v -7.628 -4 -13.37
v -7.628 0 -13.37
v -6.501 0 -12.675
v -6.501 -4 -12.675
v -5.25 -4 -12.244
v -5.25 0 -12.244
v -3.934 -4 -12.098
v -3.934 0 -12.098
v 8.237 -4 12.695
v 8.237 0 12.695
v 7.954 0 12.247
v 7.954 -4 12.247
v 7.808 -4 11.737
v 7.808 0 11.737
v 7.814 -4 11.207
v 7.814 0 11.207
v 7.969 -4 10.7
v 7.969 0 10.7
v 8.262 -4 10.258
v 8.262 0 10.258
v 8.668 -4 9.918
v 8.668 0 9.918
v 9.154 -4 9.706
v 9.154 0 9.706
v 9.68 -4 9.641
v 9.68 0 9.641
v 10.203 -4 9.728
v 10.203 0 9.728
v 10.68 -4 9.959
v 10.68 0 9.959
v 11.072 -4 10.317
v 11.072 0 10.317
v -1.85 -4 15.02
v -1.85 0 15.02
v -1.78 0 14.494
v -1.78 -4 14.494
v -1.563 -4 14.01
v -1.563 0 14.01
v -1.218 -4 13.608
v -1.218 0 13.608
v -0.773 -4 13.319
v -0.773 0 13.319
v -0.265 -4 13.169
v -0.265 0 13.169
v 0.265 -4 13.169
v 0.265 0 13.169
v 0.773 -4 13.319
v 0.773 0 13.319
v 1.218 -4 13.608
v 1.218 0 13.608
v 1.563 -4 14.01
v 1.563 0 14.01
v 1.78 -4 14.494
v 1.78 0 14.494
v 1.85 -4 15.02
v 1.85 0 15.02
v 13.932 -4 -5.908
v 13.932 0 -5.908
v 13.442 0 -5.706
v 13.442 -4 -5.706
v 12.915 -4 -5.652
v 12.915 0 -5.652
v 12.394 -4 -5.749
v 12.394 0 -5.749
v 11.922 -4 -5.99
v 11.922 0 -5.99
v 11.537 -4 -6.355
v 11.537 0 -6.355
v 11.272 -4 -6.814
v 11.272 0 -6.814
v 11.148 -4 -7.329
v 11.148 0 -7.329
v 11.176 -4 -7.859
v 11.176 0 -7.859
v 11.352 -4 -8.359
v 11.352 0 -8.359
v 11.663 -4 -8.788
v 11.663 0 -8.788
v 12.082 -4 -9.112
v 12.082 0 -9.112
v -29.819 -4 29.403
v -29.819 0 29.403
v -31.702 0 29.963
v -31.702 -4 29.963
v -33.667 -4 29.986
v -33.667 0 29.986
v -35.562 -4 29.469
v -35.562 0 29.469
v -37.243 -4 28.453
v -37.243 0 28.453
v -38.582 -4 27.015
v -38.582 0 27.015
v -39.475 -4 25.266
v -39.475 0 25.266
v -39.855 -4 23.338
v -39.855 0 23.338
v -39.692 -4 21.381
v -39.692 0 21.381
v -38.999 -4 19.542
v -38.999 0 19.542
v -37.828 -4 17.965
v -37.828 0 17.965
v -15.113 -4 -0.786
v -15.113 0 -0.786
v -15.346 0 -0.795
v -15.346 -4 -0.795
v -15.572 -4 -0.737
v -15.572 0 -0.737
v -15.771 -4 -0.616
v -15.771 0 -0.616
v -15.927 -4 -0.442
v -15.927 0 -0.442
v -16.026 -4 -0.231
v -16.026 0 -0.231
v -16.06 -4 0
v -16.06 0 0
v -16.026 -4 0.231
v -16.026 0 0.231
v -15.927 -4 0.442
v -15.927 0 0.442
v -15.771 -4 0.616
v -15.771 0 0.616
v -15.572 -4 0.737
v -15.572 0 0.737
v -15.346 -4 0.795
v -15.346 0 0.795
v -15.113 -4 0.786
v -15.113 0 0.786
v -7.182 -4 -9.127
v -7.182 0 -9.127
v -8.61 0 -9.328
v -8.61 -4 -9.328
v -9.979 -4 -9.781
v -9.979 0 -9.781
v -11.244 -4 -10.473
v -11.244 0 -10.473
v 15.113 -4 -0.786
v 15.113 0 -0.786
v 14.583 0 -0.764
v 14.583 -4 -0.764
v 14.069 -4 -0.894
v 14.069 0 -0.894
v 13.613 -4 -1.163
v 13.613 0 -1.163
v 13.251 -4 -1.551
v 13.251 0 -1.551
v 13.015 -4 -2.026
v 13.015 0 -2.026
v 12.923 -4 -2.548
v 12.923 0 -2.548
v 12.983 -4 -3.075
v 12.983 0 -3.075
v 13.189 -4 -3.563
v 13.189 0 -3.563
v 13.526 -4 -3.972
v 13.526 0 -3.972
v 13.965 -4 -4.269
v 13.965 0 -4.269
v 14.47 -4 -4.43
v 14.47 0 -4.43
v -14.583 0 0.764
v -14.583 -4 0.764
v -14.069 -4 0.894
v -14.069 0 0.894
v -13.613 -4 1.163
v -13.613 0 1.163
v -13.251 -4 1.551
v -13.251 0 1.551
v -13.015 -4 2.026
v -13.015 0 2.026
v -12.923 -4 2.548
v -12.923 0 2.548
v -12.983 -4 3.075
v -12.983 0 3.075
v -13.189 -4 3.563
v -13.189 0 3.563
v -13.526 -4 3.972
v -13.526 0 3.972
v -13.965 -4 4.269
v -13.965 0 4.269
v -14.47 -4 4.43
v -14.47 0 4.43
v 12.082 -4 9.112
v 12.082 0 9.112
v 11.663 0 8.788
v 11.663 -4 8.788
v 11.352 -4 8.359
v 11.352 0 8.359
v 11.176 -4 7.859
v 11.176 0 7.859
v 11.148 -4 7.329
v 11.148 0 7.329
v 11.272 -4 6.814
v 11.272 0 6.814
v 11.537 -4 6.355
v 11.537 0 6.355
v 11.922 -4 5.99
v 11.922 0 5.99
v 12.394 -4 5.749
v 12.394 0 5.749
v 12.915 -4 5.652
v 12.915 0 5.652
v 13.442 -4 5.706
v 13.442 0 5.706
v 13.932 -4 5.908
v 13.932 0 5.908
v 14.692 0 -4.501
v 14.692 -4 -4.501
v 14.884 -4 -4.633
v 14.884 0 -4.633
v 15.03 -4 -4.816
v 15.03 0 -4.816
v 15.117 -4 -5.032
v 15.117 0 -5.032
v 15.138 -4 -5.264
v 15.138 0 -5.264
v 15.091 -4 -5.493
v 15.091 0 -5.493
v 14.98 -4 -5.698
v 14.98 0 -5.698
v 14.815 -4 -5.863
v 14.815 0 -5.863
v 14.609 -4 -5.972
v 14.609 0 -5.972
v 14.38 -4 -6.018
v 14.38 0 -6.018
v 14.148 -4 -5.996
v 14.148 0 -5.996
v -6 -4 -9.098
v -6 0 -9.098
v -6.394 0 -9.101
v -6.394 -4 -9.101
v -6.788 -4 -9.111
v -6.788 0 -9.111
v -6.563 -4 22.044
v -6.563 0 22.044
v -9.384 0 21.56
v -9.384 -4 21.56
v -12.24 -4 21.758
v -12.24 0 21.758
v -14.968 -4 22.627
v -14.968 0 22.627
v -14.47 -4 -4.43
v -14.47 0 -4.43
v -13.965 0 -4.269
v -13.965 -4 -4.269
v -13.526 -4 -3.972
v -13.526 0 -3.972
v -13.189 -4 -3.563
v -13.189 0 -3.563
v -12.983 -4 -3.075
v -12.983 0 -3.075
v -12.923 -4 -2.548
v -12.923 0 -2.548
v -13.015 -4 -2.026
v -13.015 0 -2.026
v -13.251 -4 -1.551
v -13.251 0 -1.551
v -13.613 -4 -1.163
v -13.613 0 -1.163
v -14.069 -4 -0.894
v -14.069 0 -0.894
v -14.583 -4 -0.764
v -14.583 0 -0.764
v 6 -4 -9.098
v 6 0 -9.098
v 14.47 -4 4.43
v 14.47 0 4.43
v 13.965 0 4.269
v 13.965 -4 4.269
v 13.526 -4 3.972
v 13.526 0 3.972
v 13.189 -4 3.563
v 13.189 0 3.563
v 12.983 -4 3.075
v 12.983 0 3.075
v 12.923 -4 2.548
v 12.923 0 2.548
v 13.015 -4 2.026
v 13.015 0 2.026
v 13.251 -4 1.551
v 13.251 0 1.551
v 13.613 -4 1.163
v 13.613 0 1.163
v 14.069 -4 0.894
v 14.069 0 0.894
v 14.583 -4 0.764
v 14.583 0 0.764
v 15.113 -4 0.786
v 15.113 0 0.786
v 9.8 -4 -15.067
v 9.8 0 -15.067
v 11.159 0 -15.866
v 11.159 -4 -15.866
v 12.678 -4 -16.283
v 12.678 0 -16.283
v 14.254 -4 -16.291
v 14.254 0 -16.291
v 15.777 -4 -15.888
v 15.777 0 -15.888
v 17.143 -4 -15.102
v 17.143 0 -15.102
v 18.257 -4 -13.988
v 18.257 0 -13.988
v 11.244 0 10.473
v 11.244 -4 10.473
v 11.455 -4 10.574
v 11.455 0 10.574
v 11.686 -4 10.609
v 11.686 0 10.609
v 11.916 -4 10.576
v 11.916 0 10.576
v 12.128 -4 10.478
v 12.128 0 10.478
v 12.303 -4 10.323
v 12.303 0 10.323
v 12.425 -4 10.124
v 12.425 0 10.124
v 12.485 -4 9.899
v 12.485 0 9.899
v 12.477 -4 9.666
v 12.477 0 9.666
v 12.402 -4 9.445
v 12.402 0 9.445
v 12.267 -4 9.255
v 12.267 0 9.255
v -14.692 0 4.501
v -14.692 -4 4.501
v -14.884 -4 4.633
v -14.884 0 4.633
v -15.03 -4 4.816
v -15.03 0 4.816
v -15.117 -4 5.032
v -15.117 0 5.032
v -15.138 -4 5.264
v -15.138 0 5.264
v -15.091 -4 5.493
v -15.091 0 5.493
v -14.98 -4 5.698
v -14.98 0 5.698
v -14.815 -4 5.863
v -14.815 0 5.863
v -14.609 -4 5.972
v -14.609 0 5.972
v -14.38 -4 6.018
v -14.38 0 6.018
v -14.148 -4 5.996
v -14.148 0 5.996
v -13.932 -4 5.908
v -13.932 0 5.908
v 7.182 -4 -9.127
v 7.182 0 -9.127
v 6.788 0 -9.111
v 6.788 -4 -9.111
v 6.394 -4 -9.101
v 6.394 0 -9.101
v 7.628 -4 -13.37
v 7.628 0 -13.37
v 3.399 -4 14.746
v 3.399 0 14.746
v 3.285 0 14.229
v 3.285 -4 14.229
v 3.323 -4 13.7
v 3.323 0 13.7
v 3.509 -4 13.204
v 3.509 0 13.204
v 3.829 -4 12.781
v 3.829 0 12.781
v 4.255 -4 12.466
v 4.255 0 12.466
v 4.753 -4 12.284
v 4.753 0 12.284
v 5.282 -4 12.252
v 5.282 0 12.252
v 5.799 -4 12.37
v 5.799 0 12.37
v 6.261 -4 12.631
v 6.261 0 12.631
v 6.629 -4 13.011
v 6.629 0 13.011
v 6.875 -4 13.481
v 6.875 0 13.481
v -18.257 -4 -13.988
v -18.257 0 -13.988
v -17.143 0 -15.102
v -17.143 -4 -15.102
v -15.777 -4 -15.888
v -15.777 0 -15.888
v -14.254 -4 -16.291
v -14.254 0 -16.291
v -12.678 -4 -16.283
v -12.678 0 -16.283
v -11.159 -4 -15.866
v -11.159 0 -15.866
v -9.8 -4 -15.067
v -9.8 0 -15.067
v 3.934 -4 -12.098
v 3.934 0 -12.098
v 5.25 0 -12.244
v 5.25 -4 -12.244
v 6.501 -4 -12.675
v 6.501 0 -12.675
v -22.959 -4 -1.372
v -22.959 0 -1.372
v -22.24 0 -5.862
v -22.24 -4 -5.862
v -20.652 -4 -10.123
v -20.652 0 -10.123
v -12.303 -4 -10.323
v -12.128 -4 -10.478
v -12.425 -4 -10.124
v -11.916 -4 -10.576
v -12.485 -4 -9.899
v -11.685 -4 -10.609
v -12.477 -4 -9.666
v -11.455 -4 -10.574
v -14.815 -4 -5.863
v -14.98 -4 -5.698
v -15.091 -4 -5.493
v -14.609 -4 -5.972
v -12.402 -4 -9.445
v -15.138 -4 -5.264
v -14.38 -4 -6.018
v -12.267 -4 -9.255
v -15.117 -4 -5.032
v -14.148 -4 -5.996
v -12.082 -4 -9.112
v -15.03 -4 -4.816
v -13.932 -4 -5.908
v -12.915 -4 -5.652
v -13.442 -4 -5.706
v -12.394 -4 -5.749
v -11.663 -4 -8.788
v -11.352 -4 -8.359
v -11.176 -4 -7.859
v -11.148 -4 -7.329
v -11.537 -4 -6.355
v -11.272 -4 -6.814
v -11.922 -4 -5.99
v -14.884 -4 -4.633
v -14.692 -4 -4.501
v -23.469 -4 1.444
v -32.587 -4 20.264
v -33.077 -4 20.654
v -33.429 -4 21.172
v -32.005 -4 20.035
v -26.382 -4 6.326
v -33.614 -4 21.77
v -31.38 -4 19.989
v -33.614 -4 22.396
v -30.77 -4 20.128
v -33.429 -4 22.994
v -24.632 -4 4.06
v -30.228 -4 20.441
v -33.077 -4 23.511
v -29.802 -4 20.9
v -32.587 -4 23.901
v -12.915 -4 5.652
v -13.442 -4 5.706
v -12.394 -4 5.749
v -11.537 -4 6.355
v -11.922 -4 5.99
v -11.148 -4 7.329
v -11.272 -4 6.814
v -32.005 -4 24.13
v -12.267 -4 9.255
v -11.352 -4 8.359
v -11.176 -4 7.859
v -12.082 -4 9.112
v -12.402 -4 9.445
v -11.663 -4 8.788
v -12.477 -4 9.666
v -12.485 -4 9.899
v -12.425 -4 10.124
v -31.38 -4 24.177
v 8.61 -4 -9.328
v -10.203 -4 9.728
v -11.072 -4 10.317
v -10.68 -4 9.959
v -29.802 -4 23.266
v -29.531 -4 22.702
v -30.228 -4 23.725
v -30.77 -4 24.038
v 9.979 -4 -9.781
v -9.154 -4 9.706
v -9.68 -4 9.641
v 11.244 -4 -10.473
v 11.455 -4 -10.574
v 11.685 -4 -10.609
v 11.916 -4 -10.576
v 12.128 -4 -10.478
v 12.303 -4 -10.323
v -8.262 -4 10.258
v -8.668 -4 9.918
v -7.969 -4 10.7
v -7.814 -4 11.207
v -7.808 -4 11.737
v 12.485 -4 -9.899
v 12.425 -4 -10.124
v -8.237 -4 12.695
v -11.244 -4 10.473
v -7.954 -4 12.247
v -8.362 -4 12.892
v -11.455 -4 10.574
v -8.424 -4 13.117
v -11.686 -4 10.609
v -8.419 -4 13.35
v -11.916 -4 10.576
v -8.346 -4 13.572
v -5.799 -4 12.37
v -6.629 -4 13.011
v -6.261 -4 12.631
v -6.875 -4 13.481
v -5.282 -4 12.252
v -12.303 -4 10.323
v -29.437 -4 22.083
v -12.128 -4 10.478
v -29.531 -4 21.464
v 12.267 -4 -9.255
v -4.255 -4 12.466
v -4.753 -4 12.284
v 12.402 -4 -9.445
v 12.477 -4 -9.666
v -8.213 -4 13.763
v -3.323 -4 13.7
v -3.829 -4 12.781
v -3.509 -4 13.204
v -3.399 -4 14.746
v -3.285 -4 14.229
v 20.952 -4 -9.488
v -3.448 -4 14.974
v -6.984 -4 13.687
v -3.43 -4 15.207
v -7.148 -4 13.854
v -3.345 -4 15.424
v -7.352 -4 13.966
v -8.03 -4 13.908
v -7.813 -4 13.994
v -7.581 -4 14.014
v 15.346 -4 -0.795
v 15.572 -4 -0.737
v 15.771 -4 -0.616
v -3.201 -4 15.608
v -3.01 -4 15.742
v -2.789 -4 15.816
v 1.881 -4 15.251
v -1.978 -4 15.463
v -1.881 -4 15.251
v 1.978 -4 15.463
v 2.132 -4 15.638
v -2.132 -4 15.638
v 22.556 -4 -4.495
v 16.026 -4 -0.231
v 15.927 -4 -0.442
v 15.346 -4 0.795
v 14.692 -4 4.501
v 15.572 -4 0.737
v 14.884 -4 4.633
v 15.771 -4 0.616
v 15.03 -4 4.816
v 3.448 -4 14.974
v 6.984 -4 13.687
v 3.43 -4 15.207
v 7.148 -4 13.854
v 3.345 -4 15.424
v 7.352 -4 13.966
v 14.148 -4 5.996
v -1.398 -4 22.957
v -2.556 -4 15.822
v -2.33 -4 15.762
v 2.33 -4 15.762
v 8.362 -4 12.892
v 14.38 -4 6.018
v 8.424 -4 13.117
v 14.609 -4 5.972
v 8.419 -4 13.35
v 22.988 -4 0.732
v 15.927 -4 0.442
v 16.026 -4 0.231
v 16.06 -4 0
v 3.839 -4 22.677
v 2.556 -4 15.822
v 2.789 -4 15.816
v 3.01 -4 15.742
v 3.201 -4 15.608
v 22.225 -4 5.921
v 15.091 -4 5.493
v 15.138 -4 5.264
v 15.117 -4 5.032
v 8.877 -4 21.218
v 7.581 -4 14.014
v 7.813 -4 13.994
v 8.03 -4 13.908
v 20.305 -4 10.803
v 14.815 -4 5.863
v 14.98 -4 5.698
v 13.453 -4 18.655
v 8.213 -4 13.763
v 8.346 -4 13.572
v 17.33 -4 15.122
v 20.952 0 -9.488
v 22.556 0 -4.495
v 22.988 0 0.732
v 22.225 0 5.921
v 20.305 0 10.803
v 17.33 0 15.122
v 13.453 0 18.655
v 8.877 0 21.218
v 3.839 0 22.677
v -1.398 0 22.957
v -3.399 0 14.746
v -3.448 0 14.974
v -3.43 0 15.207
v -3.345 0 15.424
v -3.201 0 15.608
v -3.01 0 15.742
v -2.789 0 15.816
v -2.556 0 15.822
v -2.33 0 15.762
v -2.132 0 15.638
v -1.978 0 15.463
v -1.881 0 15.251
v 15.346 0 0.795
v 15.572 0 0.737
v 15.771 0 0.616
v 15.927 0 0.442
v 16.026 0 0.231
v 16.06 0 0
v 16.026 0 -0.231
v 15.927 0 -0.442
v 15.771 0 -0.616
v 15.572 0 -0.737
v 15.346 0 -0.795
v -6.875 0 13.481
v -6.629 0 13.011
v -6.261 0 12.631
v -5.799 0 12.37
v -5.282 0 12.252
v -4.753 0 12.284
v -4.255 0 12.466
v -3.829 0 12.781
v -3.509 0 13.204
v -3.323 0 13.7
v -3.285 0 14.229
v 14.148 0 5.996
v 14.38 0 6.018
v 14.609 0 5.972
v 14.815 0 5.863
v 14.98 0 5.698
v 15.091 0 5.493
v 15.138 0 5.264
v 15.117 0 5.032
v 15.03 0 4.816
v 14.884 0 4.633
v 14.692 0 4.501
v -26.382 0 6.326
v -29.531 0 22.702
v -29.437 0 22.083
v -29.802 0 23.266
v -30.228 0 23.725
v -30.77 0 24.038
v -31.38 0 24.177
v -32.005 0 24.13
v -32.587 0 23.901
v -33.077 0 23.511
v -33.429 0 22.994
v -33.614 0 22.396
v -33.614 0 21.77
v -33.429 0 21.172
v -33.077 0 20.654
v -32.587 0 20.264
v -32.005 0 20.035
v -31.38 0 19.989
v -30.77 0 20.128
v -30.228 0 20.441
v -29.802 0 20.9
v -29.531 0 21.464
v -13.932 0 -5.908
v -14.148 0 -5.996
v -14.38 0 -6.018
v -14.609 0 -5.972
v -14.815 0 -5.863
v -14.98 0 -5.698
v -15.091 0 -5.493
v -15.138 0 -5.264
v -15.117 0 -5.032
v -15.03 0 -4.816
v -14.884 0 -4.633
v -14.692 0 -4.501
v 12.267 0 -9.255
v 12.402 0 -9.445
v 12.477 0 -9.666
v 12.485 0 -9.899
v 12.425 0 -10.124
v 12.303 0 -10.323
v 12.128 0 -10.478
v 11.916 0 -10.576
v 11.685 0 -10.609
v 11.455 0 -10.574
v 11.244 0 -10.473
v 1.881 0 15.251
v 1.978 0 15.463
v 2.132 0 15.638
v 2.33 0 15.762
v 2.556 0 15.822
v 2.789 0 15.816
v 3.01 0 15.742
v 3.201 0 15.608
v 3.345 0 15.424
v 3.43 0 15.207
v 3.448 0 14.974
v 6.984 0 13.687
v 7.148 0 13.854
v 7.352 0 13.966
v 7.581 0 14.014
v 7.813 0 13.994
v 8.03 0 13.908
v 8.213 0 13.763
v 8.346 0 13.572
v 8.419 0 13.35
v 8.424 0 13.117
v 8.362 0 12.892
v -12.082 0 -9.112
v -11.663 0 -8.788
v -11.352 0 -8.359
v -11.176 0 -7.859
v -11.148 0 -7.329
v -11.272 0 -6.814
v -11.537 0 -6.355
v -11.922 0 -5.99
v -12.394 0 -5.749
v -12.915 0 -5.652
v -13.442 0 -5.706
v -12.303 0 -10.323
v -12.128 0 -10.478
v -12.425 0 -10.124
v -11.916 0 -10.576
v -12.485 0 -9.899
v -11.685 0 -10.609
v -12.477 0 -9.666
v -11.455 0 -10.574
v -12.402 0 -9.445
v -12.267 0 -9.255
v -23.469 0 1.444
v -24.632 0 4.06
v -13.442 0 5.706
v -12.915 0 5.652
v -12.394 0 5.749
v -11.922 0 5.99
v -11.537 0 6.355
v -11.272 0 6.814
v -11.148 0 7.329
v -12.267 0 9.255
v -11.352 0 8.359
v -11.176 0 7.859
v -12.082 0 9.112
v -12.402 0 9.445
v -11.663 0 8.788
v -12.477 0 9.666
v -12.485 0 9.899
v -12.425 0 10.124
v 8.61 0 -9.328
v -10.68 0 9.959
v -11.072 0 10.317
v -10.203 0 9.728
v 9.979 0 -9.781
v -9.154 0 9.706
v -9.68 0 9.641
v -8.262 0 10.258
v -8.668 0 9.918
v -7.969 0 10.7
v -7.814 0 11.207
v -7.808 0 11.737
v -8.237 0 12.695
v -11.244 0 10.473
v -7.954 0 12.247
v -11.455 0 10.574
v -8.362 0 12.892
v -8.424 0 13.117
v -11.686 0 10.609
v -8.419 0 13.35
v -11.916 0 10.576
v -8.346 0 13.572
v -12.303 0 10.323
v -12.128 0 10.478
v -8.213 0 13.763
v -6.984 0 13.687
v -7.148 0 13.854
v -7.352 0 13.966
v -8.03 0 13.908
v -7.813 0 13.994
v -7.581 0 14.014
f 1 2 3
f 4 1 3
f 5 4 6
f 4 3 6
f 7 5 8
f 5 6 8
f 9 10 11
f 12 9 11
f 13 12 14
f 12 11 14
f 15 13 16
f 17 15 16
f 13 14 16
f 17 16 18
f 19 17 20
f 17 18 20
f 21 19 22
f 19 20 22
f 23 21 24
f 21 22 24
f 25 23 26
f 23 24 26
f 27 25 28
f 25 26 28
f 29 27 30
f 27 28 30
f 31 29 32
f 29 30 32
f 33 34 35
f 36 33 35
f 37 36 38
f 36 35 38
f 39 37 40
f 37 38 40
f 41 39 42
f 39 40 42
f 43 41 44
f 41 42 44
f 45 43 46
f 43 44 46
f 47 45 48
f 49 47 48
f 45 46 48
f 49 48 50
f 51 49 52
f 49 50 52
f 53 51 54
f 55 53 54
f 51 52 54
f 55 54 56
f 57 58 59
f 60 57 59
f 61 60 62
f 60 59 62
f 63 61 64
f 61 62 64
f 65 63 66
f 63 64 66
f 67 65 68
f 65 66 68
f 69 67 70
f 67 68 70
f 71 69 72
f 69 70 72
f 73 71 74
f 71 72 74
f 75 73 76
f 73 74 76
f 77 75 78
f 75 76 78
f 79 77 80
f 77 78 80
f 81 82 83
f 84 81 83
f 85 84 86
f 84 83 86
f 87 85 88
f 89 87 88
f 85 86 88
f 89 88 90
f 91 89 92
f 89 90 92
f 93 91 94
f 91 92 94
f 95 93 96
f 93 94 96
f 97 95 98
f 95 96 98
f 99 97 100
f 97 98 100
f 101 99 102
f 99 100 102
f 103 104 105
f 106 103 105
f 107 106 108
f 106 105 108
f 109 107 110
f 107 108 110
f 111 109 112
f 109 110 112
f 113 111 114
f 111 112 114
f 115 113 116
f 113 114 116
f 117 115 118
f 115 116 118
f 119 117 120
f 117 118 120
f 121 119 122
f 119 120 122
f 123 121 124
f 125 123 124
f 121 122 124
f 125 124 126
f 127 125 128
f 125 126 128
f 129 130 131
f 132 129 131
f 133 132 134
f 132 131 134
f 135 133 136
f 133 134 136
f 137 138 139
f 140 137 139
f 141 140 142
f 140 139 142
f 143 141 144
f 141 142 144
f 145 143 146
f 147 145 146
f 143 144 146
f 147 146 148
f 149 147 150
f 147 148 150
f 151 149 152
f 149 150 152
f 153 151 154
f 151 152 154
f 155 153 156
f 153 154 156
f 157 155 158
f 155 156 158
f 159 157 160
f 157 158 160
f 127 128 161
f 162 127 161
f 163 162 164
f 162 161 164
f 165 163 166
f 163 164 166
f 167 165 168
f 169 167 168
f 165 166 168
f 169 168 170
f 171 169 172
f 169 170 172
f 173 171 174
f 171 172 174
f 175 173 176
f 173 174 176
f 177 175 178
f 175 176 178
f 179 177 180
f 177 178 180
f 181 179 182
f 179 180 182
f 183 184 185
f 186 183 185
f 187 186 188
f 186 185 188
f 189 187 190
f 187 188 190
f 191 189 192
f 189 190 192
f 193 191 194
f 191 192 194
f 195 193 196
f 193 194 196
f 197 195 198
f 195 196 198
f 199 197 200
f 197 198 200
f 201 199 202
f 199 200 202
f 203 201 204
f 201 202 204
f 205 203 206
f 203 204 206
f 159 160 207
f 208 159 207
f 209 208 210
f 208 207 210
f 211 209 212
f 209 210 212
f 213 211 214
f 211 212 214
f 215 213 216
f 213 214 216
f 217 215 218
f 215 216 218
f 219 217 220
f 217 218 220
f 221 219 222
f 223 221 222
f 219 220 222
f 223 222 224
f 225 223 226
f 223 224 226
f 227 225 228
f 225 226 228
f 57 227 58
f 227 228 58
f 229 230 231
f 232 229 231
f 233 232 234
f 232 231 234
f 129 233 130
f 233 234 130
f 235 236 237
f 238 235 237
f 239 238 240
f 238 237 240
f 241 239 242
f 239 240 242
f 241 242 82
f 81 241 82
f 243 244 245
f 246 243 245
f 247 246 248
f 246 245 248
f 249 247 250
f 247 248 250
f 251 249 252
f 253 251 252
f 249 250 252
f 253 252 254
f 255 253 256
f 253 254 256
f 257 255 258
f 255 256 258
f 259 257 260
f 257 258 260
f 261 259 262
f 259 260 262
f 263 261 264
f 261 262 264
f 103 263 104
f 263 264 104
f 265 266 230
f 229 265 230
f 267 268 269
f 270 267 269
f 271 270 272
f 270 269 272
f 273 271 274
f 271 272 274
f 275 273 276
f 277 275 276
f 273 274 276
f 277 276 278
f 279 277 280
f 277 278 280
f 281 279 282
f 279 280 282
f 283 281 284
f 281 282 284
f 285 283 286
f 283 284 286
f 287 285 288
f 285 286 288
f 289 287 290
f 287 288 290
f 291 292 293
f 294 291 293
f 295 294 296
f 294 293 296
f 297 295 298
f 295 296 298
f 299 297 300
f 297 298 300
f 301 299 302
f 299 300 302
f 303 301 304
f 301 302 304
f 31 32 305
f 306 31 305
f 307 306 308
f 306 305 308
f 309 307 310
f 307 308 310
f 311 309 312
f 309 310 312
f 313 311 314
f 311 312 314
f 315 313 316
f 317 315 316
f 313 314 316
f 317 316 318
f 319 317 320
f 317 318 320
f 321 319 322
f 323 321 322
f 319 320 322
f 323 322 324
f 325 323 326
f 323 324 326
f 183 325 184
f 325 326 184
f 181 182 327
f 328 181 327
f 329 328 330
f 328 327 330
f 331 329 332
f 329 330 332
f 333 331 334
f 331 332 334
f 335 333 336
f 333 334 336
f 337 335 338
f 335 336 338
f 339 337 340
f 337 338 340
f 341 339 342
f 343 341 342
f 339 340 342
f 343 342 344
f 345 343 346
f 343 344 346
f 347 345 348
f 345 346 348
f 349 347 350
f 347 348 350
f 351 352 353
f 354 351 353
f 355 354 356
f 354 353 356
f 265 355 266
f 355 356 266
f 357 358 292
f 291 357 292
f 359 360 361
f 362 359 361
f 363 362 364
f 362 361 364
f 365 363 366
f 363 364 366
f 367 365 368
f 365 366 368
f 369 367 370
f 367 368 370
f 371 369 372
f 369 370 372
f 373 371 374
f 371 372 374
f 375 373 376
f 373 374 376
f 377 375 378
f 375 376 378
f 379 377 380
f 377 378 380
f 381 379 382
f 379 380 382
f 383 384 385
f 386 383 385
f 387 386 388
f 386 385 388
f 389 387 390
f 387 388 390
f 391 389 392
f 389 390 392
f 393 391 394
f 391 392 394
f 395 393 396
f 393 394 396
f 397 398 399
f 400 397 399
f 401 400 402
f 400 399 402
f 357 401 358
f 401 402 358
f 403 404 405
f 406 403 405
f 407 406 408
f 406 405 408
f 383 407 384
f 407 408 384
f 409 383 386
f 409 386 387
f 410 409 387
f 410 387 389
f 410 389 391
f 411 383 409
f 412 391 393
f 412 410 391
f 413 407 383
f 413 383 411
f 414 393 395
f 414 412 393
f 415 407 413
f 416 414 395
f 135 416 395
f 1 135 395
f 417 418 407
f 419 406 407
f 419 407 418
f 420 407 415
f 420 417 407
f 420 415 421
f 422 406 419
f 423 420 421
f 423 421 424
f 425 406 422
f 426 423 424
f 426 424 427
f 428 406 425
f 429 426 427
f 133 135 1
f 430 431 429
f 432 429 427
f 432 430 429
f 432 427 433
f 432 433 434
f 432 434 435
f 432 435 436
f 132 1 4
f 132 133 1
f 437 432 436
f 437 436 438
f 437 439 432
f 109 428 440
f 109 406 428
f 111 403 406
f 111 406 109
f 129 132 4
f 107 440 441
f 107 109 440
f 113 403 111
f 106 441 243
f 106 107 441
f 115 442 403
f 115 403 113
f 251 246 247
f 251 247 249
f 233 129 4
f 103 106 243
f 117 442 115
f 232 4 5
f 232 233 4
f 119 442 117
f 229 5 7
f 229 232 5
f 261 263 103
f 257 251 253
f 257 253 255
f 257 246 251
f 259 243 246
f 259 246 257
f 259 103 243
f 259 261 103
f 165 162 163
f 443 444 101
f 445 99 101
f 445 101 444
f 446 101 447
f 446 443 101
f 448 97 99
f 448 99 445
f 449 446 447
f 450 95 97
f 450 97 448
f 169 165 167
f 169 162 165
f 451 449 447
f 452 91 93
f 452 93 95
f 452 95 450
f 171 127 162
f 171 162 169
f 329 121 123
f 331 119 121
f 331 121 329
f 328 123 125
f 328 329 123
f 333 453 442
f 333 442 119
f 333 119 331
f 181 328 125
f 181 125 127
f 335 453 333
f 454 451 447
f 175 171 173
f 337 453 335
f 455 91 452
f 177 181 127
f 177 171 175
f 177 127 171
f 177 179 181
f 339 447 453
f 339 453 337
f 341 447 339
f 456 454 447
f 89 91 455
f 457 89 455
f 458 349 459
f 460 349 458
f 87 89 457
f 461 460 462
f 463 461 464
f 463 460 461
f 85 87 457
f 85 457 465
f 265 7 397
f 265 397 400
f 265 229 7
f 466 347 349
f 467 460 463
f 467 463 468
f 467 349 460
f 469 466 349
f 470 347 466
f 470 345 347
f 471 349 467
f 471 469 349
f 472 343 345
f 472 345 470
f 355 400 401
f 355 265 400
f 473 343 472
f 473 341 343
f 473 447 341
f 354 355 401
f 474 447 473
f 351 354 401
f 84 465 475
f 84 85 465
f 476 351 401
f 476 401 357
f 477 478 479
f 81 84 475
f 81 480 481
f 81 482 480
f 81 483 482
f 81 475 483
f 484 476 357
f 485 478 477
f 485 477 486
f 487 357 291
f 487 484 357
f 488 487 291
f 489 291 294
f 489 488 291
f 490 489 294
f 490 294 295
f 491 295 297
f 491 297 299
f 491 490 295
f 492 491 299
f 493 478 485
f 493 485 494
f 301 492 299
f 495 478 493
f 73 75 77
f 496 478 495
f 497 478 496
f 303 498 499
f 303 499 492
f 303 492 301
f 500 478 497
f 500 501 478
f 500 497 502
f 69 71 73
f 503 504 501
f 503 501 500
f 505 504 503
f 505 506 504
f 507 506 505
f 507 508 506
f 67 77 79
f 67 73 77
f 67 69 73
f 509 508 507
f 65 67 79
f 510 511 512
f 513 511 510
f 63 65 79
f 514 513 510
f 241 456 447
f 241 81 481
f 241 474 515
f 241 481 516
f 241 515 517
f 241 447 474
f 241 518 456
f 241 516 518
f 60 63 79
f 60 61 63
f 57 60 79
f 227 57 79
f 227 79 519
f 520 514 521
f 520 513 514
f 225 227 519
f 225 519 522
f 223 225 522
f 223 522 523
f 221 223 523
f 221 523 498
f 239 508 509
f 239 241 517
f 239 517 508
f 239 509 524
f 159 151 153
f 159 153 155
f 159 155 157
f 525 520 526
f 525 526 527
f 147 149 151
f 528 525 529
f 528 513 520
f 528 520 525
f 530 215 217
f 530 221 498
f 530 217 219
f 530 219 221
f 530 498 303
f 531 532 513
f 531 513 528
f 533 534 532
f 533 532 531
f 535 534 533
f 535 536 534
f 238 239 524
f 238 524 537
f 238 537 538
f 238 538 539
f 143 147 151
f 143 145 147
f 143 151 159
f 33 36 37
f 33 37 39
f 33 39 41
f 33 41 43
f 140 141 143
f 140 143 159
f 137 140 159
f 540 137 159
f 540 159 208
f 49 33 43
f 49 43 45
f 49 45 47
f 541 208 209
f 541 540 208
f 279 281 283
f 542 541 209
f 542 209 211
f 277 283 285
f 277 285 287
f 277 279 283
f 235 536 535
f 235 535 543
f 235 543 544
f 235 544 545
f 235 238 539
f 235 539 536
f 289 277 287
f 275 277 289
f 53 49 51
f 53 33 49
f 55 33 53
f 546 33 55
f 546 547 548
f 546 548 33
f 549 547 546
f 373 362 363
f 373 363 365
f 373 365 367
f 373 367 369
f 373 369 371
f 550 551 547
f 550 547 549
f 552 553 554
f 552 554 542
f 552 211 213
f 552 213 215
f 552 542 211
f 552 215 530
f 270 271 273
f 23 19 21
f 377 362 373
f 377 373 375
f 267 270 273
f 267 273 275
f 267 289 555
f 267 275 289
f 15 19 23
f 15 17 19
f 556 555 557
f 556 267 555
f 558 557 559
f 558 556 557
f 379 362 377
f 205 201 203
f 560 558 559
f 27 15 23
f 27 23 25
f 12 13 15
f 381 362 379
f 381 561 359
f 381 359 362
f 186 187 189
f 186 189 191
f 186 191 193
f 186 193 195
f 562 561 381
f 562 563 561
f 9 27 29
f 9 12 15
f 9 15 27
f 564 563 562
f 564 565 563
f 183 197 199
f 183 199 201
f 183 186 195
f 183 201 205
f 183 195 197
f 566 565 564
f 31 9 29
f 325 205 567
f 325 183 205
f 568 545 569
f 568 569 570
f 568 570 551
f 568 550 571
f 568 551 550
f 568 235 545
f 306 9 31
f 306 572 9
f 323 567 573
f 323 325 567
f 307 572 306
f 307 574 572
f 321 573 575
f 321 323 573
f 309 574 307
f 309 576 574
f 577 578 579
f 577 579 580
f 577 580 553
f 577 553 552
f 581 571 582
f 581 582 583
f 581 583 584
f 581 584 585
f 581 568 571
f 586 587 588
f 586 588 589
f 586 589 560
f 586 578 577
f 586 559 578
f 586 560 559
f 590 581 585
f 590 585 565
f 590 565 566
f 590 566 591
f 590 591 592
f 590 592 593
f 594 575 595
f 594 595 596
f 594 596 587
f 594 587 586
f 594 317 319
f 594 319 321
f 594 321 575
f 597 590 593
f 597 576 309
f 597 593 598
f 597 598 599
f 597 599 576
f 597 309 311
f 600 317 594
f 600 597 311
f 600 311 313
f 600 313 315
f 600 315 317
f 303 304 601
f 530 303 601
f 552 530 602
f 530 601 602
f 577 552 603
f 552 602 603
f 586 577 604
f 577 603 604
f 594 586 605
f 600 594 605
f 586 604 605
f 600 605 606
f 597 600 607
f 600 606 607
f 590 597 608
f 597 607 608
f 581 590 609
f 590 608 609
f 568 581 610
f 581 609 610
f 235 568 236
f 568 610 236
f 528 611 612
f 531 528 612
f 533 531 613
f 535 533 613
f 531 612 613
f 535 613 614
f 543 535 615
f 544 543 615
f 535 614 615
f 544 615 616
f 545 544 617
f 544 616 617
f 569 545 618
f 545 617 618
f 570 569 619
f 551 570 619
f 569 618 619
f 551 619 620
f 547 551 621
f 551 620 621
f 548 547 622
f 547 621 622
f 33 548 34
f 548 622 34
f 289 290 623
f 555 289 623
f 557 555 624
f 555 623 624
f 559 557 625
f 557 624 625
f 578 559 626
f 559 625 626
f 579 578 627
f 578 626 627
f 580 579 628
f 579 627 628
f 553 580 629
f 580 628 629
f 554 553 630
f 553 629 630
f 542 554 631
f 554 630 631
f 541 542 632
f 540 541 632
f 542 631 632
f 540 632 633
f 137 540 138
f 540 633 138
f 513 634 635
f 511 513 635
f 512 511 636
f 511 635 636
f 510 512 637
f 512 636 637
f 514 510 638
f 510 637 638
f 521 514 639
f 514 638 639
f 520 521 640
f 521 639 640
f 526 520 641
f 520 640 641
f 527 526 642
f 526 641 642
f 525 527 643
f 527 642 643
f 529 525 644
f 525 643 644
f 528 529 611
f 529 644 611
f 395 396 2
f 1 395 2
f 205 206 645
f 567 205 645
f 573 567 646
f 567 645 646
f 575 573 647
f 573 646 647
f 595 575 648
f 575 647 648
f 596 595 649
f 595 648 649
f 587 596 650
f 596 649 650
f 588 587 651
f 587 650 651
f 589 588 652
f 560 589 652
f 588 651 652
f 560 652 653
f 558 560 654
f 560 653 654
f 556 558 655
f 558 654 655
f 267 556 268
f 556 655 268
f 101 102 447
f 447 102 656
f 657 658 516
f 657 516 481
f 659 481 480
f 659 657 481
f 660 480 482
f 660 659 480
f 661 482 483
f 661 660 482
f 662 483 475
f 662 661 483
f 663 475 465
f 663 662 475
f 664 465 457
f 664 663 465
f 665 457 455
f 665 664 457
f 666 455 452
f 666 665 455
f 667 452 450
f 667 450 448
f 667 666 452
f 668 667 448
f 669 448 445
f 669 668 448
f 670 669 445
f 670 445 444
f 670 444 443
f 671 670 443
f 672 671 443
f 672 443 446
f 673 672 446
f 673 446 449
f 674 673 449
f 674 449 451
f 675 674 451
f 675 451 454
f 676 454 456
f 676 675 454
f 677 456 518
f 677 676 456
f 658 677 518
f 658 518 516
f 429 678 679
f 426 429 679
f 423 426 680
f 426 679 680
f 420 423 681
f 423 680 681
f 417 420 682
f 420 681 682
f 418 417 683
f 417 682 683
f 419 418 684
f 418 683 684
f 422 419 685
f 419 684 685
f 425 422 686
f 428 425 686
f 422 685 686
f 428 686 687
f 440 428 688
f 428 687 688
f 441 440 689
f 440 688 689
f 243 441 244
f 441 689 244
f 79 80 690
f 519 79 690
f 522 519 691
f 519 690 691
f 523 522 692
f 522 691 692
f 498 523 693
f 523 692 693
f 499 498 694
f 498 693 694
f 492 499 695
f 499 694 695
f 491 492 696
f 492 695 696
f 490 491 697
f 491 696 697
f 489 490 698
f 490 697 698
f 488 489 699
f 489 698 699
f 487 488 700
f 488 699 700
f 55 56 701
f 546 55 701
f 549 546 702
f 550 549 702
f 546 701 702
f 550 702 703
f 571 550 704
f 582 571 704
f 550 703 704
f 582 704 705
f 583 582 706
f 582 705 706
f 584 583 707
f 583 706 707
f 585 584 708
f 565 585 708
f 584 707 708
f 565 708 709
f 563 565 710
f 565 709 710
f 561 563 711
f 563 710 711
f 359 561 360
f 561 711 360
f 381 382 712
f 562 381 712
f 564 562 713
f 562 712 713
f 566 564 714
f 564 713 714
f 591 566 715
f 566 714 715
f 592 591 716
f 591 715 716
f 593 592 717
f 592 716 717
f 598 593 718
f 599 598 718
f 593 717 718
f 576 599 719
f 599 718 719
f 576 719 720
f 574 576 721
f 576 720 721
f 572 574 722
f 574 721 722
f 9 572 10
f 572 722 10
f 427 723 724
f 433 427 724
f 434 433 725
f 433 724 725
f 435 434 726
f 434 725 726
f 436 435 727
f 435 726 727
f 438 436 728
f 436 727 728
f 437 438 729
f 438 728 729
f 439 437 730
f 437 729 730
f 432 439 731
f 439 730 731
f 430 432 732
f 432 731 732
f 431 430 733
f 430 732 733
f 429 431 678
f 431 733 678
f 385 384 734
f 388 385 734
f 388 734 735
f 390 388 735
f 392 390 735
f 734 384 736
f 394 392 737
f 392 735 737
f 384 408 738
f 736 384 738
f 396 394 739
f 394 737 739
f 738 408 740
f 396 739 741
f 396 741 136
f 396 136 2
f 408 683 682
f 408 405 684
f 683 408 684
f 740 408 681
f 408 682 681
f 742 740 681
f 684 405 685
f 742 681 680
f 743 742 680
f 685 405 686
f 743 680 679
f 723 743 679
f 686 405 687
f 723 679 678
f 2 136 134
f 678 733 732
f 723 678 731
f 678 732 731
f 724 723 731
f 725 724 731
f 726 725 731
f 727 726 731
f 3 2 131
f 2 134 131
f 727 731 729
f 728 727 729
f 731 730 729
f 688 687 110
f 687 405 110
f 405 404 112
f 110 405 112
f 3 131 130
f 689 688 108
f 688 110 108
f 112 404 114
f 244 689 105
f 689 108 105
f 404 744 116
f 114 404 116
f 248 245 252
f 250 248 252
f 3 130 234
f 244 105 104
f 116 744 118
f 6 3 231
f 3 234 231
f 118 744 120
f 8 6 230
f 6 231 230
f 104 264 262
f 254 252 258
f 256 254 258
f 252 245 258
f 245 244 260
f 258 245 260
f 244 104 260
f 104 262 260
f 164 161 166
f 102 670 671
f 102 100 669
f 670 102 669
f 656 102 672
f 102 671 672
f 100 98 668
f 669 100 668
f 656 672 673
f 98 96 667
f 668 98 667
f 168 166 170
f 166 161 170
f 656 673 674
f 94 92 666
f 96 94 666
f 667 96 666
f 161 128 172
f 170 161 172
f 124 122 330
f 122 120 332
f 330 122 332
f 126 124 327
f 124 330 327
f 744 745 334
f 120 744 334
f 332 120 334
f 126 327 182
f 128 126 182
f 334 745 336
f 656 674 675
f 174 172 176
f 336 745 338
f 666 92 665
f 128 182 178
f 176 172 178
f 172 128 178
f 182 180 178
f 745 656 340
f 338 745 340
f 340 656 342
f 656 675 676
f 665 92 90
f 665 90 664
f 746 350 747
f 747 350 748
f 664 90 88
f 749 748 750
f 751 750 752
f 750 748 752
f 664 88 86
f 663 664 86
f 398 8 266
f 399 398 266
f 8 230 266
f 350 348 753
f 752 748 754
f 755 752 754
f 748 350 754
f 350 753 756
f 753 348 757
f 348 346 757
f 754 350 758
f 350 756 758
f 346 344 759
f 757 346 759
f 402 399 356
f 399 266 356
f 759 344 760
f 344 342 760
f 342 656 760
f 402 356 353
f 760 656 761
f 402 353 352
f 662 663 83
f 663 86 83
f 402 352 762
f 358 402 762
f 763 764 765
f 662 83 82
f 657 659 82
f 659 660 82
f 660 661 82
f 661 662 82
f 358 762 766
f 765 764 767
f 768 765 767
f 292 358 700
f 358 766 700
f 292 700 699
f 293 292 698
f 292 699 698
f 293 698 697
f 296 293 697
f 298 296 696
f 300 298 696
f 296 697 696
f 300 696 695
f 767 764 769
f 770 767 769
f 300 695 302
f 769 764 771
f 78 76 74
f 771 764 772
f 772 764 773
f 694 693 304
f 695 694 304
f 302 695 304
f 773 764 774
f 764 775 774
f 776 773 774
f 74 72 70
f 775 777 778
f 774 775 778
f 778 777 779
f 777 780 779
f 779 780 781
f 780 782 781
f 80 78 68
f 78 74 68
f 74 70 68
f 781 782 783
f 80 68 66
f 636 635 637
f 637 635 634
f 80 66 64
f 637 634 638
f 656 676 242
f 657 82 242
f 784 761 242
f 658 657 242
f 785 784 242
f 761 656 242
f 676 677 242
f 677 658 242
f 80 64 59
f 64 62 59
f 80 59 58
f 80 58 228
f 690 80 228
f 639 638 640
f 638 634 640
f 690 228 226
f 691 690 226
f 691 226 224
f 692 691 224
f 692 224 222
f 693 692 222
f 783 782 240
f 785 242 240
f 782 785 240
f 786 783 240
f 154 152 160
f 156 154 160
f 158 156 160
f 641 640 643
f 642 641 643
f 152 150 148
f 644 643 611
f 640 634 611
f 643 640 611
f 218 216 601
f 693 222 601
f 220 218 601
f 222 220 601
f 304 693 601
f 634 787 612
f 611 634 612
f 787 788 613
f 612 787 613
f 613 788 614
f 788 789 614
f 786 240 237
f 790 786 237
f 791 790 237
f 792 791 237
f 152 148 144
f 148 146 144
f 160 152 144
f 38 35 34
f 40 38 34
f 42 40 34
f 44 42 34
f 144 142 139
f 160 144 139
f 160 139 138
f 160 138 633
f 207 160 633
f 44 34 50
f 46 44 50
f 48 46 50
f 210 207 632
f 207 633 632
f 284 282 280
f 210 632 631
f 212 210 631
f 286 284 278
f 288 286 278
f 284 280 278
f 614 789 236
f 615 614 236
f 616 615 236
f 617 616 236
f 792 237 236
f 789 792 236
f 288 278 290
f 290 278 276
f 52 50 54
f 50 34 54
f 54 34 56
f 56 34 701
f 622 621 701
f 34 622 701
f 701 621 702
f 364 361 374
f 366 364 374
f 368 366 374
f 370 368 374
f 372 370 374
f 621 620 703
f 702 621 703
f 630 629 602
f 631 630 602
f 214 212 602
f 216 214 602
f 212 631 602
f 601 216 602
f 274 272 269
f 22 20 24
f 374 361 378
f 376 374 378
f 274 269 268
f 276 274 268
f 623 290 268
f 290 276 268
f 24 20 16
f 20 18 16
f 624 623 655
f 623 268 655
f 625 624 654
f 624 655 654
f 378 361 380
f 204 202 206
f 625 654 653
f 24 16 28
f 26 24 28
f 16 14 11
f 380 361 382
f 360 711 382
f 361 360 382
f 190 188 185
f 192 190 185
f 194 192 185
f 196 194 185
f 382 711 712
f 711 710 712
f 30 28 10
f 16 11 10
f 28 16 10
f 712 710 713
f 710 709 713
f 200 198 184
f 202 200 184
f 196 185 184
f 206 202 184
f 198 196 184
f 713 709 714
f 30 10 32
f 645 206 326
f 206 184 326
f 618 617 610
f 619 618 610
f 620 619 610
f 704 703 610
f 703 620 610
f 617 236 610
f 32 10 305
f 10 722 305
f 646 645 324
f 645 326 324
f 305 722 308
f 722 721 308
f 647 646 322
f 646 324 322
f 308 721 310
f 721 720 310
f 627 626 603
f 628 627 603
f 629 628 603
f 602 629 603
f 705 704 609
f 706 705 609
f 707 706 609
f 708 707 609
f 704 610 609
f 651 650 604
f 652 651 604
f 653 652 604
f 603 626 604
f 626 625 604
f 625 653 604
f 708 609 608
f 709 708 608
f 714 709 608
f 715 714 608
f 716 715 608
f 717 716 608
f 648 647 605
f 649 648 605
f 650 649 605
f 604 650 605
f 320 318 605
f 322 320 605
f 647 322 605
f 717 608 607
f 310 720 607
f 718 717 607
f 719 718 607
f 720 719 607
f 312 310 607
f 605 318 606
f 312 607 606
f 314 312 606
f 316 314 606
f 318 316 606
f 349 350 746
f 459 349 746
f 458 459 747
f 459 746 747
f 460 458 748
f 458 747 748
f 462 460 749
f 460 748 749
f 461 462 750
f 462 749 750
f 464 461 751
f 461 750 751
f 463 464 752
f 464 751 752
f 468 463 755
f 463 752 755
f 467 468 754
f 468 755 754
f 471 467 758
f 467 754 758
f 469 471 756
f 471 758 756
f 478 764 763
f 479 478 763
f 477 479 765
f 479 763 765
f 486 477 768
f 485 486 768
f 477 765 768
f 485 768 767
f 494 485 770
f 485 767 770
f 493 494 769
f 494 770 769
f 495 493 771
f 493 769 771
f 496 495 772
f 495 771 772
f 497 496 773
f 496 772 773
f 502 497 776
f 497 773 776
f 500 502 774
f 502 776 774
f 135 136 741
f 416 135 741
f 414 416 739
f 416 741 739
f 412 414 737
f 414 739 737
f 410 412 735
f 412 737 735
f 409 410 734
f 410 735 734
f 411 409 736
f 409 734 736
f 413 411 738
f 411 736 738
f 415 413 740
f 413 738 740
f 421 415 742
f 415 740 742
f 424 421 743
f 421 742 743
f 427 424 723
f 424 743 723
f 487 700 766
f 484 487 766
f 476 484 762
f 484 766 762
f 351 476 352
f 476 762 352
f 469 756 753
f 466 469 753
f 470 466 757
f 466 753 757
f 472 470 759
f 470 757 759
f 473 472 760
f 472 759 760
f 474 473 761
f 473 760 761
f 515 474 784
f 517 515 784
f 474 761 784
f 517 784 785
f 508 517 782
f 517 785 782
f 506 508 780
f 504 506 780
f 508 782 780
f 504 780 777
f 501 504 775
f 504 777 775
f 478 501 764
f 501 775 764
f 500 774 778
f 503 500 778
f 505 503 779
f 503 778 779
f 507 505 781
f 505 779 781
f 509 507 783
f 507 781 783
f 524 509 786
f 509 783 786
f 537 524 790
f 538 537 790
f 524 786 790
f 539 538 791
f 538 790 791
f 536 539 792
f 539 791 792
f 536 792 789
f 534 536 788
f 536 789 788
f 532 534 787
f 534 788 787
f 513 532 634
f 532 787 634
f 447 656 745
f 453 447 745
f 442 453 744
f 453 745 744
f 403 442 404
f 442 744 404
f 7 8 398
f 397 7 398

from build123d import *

# Parameters (mm, degrees)
F0_R     = 2.1
F1_DEPTH = 4


with BuildPart() as f1:
    # F0 (on Front) → F1 (new body)
    with BuildSketch(Plane.XZ):
        with BuildLine():
            ThreePointArc((-26.381971, 6.326054), (-23.972685, 2.787165), (-22.959026, -1.372268))
            ThreePointArc((-22.959026, -1.372268), (-21.551931, -8.032077), (-18.25719, -13.988388))
            ThreePointArc((-18.25719, -13.988388), (-14.253779, -16.291001), (-9.800476, -15.067308))
            Line((-9.800476, -15.067308), (-7.628003, -13.369986))
            ThreePointArc((-7.628003, -13.369986), (-5.887443, -12.424939), (-3.934034, -12.098051))
            Line((-3.934034, -12.098051), (3.934034, -12.098051))
            ThreePointArc((3.934034, -12.098051), (5.887443, -12.424939), (7.628003, -13.369986))
            Line((7.628003, -13.369986), (9.800476, -15.067308))
            ThreePointArc((9.800476, -15.067308), (14.253779, -16.291001), (18.25719, -13.988388))
            ThreePointArc((18.25719, -13.988388), (18.941172, 13.047299), (-6.562939, 22.043771))
            ThreePointArc((-6.562939, 22.043771), (-10.818219, 21.573689), (-14.967711, 22.627305))
            Line((-14.967711, 22.627305), (-29.819204, 29.402617))
            ThreePointArc((-29.819204, 29.402617), (-38.582061, 27.01545), (-37.828191, 17.964599))
            Line((-37.828191, 17.964599), (-26.381971, 6.326054))
        make_face()
        with BuildLine():
            ThreePointArc((11.244166, -10.473286), (9.304982, -9.523645), (7.182465, -9.127198))
            ThreePointArc((7.182465, -9.127198), (6.591412, -9.105339), (6, -9.098051))
            Line((6, -9.098051), (-6, -9.098051))
            ThreePointArc((-6, -9.098051), (-6.591412, -9.105339), (-7.182465, -9.127198))
            ThreePointArc((-7.182465, -9.127198), (-9.304982, -9.523645), (-11.244166, -10.473286))
            ThreePointArc((-11.244166, -10.473286), (-12.370984, -10.228297), (-12.082394, -9.11185))
            ThreePointArc((-12.082394, -9.11185), (-11.388234, -6.575), (-13.932291, -5.907735))
            ThreePointArc((-13.932291, -5.907735), (-15.091357, -5.492805), (-14.470173, -4.429916))
            ThreePointArc((-14.470173, -4.429916), (-12.950222, -2.283474), (-15.112635, -0.786331))
            ThreePointArc((-15.112635, -0.786331), (-16.059887, 0), (-15.112635, 0.786331))
            ThreePointArc((-15.112635, 0.786331), (-12.950222, 2.283474), (-14.470173, 4.429916))
            ThreePointArc((-14.470173, 4.429916), (-15.091357, 5.492805), (-13.932291, 5.907735))
            ThreePointArc((-13.932291, 5.907735), (-11.388234, 6.575), (-12.082394, 9.11185))
            ThreePointArc((-12.082394, 9.11185), (-12.302587, 10.323096), (-11.071506, 10.316579))
            ThreePointArc((-11.071506, 10.316579), (-8.452657, 10.073484), (-8.237301, 12.69476))
            ThreePointArc((-8.237301, 12.69476), (-8.029943, 13.90827), (-6.875335, 13.481092))
            ThreePointArc((-6.875335, 13.481092), (-4.497565, 12.356958), (-3.398667, 14.746495))
            ThreePointArc((-3.398667, 14.746495), (-2.78877, 15.815901), (-1.849896, 15.019585))
            ThreePointArc((-1.849896, 15.019585), (0, 13.15), (1.849896, 15.019585))
            ThreePointArc((1.849896, 15.019585), (2.78877, 15.815901), (3.398667, 14.746495))
            ThreePointArc((3.398667, 14.746495), (4.497565, 12.356958), (6.875335, 13.481092))
            ThreePointArc((6.875335, 13.481092), (8.029943, 13.90827), (8.237301, 12.69476))
            ThreePointArc((8.237301, 12.69476), (8.452657, 10.073484), (11.071506, 10.316579))
            ThreePointArc((11.071506, 10.316579), (12.302587, 10.323096), (12.082394, 9.11185))
            ThreePointArc((12.082394, 9.11185), (11.388234, 6.575), (13.932291, 5.907735))
            ThreePointArc((13.932291, 5.907735), (15.091357, 5.492805), (14.470173, 4.429916))
            ThreePointArc((14.470173, 4.429916), (12.950222, 2.283474), (15.112635, 0.786331))
            ThreePointArc((15.112635, 0.786331), (16.059887, 0), (15.112635, -0.786331))
            ThreePointArc((15.112635, -0.786331), (12.950222, -2.283474), (14.470173, -4.429916))
            ThreePointArc((14.470173, -4.429916), (15.091357, -5.492805), (13.932291, -5.907735))
            ThreePointArc((13.932291, -5.907735), (11.388234, -6.575), (12.082394, -9.11185))
            ThreePointArc((12.082394, -9.11185), (12.370984, -10.228297), (11.244166, -10.473286))
        make_face(mode=Mode.SUBTRACT)
        with Locations((-31.537354, 22.082693)):
            Circle(F0_R, mode=Mode.SUBTRACT)
    extrude(amount=F1_DEPTH)


solid = f1.part
